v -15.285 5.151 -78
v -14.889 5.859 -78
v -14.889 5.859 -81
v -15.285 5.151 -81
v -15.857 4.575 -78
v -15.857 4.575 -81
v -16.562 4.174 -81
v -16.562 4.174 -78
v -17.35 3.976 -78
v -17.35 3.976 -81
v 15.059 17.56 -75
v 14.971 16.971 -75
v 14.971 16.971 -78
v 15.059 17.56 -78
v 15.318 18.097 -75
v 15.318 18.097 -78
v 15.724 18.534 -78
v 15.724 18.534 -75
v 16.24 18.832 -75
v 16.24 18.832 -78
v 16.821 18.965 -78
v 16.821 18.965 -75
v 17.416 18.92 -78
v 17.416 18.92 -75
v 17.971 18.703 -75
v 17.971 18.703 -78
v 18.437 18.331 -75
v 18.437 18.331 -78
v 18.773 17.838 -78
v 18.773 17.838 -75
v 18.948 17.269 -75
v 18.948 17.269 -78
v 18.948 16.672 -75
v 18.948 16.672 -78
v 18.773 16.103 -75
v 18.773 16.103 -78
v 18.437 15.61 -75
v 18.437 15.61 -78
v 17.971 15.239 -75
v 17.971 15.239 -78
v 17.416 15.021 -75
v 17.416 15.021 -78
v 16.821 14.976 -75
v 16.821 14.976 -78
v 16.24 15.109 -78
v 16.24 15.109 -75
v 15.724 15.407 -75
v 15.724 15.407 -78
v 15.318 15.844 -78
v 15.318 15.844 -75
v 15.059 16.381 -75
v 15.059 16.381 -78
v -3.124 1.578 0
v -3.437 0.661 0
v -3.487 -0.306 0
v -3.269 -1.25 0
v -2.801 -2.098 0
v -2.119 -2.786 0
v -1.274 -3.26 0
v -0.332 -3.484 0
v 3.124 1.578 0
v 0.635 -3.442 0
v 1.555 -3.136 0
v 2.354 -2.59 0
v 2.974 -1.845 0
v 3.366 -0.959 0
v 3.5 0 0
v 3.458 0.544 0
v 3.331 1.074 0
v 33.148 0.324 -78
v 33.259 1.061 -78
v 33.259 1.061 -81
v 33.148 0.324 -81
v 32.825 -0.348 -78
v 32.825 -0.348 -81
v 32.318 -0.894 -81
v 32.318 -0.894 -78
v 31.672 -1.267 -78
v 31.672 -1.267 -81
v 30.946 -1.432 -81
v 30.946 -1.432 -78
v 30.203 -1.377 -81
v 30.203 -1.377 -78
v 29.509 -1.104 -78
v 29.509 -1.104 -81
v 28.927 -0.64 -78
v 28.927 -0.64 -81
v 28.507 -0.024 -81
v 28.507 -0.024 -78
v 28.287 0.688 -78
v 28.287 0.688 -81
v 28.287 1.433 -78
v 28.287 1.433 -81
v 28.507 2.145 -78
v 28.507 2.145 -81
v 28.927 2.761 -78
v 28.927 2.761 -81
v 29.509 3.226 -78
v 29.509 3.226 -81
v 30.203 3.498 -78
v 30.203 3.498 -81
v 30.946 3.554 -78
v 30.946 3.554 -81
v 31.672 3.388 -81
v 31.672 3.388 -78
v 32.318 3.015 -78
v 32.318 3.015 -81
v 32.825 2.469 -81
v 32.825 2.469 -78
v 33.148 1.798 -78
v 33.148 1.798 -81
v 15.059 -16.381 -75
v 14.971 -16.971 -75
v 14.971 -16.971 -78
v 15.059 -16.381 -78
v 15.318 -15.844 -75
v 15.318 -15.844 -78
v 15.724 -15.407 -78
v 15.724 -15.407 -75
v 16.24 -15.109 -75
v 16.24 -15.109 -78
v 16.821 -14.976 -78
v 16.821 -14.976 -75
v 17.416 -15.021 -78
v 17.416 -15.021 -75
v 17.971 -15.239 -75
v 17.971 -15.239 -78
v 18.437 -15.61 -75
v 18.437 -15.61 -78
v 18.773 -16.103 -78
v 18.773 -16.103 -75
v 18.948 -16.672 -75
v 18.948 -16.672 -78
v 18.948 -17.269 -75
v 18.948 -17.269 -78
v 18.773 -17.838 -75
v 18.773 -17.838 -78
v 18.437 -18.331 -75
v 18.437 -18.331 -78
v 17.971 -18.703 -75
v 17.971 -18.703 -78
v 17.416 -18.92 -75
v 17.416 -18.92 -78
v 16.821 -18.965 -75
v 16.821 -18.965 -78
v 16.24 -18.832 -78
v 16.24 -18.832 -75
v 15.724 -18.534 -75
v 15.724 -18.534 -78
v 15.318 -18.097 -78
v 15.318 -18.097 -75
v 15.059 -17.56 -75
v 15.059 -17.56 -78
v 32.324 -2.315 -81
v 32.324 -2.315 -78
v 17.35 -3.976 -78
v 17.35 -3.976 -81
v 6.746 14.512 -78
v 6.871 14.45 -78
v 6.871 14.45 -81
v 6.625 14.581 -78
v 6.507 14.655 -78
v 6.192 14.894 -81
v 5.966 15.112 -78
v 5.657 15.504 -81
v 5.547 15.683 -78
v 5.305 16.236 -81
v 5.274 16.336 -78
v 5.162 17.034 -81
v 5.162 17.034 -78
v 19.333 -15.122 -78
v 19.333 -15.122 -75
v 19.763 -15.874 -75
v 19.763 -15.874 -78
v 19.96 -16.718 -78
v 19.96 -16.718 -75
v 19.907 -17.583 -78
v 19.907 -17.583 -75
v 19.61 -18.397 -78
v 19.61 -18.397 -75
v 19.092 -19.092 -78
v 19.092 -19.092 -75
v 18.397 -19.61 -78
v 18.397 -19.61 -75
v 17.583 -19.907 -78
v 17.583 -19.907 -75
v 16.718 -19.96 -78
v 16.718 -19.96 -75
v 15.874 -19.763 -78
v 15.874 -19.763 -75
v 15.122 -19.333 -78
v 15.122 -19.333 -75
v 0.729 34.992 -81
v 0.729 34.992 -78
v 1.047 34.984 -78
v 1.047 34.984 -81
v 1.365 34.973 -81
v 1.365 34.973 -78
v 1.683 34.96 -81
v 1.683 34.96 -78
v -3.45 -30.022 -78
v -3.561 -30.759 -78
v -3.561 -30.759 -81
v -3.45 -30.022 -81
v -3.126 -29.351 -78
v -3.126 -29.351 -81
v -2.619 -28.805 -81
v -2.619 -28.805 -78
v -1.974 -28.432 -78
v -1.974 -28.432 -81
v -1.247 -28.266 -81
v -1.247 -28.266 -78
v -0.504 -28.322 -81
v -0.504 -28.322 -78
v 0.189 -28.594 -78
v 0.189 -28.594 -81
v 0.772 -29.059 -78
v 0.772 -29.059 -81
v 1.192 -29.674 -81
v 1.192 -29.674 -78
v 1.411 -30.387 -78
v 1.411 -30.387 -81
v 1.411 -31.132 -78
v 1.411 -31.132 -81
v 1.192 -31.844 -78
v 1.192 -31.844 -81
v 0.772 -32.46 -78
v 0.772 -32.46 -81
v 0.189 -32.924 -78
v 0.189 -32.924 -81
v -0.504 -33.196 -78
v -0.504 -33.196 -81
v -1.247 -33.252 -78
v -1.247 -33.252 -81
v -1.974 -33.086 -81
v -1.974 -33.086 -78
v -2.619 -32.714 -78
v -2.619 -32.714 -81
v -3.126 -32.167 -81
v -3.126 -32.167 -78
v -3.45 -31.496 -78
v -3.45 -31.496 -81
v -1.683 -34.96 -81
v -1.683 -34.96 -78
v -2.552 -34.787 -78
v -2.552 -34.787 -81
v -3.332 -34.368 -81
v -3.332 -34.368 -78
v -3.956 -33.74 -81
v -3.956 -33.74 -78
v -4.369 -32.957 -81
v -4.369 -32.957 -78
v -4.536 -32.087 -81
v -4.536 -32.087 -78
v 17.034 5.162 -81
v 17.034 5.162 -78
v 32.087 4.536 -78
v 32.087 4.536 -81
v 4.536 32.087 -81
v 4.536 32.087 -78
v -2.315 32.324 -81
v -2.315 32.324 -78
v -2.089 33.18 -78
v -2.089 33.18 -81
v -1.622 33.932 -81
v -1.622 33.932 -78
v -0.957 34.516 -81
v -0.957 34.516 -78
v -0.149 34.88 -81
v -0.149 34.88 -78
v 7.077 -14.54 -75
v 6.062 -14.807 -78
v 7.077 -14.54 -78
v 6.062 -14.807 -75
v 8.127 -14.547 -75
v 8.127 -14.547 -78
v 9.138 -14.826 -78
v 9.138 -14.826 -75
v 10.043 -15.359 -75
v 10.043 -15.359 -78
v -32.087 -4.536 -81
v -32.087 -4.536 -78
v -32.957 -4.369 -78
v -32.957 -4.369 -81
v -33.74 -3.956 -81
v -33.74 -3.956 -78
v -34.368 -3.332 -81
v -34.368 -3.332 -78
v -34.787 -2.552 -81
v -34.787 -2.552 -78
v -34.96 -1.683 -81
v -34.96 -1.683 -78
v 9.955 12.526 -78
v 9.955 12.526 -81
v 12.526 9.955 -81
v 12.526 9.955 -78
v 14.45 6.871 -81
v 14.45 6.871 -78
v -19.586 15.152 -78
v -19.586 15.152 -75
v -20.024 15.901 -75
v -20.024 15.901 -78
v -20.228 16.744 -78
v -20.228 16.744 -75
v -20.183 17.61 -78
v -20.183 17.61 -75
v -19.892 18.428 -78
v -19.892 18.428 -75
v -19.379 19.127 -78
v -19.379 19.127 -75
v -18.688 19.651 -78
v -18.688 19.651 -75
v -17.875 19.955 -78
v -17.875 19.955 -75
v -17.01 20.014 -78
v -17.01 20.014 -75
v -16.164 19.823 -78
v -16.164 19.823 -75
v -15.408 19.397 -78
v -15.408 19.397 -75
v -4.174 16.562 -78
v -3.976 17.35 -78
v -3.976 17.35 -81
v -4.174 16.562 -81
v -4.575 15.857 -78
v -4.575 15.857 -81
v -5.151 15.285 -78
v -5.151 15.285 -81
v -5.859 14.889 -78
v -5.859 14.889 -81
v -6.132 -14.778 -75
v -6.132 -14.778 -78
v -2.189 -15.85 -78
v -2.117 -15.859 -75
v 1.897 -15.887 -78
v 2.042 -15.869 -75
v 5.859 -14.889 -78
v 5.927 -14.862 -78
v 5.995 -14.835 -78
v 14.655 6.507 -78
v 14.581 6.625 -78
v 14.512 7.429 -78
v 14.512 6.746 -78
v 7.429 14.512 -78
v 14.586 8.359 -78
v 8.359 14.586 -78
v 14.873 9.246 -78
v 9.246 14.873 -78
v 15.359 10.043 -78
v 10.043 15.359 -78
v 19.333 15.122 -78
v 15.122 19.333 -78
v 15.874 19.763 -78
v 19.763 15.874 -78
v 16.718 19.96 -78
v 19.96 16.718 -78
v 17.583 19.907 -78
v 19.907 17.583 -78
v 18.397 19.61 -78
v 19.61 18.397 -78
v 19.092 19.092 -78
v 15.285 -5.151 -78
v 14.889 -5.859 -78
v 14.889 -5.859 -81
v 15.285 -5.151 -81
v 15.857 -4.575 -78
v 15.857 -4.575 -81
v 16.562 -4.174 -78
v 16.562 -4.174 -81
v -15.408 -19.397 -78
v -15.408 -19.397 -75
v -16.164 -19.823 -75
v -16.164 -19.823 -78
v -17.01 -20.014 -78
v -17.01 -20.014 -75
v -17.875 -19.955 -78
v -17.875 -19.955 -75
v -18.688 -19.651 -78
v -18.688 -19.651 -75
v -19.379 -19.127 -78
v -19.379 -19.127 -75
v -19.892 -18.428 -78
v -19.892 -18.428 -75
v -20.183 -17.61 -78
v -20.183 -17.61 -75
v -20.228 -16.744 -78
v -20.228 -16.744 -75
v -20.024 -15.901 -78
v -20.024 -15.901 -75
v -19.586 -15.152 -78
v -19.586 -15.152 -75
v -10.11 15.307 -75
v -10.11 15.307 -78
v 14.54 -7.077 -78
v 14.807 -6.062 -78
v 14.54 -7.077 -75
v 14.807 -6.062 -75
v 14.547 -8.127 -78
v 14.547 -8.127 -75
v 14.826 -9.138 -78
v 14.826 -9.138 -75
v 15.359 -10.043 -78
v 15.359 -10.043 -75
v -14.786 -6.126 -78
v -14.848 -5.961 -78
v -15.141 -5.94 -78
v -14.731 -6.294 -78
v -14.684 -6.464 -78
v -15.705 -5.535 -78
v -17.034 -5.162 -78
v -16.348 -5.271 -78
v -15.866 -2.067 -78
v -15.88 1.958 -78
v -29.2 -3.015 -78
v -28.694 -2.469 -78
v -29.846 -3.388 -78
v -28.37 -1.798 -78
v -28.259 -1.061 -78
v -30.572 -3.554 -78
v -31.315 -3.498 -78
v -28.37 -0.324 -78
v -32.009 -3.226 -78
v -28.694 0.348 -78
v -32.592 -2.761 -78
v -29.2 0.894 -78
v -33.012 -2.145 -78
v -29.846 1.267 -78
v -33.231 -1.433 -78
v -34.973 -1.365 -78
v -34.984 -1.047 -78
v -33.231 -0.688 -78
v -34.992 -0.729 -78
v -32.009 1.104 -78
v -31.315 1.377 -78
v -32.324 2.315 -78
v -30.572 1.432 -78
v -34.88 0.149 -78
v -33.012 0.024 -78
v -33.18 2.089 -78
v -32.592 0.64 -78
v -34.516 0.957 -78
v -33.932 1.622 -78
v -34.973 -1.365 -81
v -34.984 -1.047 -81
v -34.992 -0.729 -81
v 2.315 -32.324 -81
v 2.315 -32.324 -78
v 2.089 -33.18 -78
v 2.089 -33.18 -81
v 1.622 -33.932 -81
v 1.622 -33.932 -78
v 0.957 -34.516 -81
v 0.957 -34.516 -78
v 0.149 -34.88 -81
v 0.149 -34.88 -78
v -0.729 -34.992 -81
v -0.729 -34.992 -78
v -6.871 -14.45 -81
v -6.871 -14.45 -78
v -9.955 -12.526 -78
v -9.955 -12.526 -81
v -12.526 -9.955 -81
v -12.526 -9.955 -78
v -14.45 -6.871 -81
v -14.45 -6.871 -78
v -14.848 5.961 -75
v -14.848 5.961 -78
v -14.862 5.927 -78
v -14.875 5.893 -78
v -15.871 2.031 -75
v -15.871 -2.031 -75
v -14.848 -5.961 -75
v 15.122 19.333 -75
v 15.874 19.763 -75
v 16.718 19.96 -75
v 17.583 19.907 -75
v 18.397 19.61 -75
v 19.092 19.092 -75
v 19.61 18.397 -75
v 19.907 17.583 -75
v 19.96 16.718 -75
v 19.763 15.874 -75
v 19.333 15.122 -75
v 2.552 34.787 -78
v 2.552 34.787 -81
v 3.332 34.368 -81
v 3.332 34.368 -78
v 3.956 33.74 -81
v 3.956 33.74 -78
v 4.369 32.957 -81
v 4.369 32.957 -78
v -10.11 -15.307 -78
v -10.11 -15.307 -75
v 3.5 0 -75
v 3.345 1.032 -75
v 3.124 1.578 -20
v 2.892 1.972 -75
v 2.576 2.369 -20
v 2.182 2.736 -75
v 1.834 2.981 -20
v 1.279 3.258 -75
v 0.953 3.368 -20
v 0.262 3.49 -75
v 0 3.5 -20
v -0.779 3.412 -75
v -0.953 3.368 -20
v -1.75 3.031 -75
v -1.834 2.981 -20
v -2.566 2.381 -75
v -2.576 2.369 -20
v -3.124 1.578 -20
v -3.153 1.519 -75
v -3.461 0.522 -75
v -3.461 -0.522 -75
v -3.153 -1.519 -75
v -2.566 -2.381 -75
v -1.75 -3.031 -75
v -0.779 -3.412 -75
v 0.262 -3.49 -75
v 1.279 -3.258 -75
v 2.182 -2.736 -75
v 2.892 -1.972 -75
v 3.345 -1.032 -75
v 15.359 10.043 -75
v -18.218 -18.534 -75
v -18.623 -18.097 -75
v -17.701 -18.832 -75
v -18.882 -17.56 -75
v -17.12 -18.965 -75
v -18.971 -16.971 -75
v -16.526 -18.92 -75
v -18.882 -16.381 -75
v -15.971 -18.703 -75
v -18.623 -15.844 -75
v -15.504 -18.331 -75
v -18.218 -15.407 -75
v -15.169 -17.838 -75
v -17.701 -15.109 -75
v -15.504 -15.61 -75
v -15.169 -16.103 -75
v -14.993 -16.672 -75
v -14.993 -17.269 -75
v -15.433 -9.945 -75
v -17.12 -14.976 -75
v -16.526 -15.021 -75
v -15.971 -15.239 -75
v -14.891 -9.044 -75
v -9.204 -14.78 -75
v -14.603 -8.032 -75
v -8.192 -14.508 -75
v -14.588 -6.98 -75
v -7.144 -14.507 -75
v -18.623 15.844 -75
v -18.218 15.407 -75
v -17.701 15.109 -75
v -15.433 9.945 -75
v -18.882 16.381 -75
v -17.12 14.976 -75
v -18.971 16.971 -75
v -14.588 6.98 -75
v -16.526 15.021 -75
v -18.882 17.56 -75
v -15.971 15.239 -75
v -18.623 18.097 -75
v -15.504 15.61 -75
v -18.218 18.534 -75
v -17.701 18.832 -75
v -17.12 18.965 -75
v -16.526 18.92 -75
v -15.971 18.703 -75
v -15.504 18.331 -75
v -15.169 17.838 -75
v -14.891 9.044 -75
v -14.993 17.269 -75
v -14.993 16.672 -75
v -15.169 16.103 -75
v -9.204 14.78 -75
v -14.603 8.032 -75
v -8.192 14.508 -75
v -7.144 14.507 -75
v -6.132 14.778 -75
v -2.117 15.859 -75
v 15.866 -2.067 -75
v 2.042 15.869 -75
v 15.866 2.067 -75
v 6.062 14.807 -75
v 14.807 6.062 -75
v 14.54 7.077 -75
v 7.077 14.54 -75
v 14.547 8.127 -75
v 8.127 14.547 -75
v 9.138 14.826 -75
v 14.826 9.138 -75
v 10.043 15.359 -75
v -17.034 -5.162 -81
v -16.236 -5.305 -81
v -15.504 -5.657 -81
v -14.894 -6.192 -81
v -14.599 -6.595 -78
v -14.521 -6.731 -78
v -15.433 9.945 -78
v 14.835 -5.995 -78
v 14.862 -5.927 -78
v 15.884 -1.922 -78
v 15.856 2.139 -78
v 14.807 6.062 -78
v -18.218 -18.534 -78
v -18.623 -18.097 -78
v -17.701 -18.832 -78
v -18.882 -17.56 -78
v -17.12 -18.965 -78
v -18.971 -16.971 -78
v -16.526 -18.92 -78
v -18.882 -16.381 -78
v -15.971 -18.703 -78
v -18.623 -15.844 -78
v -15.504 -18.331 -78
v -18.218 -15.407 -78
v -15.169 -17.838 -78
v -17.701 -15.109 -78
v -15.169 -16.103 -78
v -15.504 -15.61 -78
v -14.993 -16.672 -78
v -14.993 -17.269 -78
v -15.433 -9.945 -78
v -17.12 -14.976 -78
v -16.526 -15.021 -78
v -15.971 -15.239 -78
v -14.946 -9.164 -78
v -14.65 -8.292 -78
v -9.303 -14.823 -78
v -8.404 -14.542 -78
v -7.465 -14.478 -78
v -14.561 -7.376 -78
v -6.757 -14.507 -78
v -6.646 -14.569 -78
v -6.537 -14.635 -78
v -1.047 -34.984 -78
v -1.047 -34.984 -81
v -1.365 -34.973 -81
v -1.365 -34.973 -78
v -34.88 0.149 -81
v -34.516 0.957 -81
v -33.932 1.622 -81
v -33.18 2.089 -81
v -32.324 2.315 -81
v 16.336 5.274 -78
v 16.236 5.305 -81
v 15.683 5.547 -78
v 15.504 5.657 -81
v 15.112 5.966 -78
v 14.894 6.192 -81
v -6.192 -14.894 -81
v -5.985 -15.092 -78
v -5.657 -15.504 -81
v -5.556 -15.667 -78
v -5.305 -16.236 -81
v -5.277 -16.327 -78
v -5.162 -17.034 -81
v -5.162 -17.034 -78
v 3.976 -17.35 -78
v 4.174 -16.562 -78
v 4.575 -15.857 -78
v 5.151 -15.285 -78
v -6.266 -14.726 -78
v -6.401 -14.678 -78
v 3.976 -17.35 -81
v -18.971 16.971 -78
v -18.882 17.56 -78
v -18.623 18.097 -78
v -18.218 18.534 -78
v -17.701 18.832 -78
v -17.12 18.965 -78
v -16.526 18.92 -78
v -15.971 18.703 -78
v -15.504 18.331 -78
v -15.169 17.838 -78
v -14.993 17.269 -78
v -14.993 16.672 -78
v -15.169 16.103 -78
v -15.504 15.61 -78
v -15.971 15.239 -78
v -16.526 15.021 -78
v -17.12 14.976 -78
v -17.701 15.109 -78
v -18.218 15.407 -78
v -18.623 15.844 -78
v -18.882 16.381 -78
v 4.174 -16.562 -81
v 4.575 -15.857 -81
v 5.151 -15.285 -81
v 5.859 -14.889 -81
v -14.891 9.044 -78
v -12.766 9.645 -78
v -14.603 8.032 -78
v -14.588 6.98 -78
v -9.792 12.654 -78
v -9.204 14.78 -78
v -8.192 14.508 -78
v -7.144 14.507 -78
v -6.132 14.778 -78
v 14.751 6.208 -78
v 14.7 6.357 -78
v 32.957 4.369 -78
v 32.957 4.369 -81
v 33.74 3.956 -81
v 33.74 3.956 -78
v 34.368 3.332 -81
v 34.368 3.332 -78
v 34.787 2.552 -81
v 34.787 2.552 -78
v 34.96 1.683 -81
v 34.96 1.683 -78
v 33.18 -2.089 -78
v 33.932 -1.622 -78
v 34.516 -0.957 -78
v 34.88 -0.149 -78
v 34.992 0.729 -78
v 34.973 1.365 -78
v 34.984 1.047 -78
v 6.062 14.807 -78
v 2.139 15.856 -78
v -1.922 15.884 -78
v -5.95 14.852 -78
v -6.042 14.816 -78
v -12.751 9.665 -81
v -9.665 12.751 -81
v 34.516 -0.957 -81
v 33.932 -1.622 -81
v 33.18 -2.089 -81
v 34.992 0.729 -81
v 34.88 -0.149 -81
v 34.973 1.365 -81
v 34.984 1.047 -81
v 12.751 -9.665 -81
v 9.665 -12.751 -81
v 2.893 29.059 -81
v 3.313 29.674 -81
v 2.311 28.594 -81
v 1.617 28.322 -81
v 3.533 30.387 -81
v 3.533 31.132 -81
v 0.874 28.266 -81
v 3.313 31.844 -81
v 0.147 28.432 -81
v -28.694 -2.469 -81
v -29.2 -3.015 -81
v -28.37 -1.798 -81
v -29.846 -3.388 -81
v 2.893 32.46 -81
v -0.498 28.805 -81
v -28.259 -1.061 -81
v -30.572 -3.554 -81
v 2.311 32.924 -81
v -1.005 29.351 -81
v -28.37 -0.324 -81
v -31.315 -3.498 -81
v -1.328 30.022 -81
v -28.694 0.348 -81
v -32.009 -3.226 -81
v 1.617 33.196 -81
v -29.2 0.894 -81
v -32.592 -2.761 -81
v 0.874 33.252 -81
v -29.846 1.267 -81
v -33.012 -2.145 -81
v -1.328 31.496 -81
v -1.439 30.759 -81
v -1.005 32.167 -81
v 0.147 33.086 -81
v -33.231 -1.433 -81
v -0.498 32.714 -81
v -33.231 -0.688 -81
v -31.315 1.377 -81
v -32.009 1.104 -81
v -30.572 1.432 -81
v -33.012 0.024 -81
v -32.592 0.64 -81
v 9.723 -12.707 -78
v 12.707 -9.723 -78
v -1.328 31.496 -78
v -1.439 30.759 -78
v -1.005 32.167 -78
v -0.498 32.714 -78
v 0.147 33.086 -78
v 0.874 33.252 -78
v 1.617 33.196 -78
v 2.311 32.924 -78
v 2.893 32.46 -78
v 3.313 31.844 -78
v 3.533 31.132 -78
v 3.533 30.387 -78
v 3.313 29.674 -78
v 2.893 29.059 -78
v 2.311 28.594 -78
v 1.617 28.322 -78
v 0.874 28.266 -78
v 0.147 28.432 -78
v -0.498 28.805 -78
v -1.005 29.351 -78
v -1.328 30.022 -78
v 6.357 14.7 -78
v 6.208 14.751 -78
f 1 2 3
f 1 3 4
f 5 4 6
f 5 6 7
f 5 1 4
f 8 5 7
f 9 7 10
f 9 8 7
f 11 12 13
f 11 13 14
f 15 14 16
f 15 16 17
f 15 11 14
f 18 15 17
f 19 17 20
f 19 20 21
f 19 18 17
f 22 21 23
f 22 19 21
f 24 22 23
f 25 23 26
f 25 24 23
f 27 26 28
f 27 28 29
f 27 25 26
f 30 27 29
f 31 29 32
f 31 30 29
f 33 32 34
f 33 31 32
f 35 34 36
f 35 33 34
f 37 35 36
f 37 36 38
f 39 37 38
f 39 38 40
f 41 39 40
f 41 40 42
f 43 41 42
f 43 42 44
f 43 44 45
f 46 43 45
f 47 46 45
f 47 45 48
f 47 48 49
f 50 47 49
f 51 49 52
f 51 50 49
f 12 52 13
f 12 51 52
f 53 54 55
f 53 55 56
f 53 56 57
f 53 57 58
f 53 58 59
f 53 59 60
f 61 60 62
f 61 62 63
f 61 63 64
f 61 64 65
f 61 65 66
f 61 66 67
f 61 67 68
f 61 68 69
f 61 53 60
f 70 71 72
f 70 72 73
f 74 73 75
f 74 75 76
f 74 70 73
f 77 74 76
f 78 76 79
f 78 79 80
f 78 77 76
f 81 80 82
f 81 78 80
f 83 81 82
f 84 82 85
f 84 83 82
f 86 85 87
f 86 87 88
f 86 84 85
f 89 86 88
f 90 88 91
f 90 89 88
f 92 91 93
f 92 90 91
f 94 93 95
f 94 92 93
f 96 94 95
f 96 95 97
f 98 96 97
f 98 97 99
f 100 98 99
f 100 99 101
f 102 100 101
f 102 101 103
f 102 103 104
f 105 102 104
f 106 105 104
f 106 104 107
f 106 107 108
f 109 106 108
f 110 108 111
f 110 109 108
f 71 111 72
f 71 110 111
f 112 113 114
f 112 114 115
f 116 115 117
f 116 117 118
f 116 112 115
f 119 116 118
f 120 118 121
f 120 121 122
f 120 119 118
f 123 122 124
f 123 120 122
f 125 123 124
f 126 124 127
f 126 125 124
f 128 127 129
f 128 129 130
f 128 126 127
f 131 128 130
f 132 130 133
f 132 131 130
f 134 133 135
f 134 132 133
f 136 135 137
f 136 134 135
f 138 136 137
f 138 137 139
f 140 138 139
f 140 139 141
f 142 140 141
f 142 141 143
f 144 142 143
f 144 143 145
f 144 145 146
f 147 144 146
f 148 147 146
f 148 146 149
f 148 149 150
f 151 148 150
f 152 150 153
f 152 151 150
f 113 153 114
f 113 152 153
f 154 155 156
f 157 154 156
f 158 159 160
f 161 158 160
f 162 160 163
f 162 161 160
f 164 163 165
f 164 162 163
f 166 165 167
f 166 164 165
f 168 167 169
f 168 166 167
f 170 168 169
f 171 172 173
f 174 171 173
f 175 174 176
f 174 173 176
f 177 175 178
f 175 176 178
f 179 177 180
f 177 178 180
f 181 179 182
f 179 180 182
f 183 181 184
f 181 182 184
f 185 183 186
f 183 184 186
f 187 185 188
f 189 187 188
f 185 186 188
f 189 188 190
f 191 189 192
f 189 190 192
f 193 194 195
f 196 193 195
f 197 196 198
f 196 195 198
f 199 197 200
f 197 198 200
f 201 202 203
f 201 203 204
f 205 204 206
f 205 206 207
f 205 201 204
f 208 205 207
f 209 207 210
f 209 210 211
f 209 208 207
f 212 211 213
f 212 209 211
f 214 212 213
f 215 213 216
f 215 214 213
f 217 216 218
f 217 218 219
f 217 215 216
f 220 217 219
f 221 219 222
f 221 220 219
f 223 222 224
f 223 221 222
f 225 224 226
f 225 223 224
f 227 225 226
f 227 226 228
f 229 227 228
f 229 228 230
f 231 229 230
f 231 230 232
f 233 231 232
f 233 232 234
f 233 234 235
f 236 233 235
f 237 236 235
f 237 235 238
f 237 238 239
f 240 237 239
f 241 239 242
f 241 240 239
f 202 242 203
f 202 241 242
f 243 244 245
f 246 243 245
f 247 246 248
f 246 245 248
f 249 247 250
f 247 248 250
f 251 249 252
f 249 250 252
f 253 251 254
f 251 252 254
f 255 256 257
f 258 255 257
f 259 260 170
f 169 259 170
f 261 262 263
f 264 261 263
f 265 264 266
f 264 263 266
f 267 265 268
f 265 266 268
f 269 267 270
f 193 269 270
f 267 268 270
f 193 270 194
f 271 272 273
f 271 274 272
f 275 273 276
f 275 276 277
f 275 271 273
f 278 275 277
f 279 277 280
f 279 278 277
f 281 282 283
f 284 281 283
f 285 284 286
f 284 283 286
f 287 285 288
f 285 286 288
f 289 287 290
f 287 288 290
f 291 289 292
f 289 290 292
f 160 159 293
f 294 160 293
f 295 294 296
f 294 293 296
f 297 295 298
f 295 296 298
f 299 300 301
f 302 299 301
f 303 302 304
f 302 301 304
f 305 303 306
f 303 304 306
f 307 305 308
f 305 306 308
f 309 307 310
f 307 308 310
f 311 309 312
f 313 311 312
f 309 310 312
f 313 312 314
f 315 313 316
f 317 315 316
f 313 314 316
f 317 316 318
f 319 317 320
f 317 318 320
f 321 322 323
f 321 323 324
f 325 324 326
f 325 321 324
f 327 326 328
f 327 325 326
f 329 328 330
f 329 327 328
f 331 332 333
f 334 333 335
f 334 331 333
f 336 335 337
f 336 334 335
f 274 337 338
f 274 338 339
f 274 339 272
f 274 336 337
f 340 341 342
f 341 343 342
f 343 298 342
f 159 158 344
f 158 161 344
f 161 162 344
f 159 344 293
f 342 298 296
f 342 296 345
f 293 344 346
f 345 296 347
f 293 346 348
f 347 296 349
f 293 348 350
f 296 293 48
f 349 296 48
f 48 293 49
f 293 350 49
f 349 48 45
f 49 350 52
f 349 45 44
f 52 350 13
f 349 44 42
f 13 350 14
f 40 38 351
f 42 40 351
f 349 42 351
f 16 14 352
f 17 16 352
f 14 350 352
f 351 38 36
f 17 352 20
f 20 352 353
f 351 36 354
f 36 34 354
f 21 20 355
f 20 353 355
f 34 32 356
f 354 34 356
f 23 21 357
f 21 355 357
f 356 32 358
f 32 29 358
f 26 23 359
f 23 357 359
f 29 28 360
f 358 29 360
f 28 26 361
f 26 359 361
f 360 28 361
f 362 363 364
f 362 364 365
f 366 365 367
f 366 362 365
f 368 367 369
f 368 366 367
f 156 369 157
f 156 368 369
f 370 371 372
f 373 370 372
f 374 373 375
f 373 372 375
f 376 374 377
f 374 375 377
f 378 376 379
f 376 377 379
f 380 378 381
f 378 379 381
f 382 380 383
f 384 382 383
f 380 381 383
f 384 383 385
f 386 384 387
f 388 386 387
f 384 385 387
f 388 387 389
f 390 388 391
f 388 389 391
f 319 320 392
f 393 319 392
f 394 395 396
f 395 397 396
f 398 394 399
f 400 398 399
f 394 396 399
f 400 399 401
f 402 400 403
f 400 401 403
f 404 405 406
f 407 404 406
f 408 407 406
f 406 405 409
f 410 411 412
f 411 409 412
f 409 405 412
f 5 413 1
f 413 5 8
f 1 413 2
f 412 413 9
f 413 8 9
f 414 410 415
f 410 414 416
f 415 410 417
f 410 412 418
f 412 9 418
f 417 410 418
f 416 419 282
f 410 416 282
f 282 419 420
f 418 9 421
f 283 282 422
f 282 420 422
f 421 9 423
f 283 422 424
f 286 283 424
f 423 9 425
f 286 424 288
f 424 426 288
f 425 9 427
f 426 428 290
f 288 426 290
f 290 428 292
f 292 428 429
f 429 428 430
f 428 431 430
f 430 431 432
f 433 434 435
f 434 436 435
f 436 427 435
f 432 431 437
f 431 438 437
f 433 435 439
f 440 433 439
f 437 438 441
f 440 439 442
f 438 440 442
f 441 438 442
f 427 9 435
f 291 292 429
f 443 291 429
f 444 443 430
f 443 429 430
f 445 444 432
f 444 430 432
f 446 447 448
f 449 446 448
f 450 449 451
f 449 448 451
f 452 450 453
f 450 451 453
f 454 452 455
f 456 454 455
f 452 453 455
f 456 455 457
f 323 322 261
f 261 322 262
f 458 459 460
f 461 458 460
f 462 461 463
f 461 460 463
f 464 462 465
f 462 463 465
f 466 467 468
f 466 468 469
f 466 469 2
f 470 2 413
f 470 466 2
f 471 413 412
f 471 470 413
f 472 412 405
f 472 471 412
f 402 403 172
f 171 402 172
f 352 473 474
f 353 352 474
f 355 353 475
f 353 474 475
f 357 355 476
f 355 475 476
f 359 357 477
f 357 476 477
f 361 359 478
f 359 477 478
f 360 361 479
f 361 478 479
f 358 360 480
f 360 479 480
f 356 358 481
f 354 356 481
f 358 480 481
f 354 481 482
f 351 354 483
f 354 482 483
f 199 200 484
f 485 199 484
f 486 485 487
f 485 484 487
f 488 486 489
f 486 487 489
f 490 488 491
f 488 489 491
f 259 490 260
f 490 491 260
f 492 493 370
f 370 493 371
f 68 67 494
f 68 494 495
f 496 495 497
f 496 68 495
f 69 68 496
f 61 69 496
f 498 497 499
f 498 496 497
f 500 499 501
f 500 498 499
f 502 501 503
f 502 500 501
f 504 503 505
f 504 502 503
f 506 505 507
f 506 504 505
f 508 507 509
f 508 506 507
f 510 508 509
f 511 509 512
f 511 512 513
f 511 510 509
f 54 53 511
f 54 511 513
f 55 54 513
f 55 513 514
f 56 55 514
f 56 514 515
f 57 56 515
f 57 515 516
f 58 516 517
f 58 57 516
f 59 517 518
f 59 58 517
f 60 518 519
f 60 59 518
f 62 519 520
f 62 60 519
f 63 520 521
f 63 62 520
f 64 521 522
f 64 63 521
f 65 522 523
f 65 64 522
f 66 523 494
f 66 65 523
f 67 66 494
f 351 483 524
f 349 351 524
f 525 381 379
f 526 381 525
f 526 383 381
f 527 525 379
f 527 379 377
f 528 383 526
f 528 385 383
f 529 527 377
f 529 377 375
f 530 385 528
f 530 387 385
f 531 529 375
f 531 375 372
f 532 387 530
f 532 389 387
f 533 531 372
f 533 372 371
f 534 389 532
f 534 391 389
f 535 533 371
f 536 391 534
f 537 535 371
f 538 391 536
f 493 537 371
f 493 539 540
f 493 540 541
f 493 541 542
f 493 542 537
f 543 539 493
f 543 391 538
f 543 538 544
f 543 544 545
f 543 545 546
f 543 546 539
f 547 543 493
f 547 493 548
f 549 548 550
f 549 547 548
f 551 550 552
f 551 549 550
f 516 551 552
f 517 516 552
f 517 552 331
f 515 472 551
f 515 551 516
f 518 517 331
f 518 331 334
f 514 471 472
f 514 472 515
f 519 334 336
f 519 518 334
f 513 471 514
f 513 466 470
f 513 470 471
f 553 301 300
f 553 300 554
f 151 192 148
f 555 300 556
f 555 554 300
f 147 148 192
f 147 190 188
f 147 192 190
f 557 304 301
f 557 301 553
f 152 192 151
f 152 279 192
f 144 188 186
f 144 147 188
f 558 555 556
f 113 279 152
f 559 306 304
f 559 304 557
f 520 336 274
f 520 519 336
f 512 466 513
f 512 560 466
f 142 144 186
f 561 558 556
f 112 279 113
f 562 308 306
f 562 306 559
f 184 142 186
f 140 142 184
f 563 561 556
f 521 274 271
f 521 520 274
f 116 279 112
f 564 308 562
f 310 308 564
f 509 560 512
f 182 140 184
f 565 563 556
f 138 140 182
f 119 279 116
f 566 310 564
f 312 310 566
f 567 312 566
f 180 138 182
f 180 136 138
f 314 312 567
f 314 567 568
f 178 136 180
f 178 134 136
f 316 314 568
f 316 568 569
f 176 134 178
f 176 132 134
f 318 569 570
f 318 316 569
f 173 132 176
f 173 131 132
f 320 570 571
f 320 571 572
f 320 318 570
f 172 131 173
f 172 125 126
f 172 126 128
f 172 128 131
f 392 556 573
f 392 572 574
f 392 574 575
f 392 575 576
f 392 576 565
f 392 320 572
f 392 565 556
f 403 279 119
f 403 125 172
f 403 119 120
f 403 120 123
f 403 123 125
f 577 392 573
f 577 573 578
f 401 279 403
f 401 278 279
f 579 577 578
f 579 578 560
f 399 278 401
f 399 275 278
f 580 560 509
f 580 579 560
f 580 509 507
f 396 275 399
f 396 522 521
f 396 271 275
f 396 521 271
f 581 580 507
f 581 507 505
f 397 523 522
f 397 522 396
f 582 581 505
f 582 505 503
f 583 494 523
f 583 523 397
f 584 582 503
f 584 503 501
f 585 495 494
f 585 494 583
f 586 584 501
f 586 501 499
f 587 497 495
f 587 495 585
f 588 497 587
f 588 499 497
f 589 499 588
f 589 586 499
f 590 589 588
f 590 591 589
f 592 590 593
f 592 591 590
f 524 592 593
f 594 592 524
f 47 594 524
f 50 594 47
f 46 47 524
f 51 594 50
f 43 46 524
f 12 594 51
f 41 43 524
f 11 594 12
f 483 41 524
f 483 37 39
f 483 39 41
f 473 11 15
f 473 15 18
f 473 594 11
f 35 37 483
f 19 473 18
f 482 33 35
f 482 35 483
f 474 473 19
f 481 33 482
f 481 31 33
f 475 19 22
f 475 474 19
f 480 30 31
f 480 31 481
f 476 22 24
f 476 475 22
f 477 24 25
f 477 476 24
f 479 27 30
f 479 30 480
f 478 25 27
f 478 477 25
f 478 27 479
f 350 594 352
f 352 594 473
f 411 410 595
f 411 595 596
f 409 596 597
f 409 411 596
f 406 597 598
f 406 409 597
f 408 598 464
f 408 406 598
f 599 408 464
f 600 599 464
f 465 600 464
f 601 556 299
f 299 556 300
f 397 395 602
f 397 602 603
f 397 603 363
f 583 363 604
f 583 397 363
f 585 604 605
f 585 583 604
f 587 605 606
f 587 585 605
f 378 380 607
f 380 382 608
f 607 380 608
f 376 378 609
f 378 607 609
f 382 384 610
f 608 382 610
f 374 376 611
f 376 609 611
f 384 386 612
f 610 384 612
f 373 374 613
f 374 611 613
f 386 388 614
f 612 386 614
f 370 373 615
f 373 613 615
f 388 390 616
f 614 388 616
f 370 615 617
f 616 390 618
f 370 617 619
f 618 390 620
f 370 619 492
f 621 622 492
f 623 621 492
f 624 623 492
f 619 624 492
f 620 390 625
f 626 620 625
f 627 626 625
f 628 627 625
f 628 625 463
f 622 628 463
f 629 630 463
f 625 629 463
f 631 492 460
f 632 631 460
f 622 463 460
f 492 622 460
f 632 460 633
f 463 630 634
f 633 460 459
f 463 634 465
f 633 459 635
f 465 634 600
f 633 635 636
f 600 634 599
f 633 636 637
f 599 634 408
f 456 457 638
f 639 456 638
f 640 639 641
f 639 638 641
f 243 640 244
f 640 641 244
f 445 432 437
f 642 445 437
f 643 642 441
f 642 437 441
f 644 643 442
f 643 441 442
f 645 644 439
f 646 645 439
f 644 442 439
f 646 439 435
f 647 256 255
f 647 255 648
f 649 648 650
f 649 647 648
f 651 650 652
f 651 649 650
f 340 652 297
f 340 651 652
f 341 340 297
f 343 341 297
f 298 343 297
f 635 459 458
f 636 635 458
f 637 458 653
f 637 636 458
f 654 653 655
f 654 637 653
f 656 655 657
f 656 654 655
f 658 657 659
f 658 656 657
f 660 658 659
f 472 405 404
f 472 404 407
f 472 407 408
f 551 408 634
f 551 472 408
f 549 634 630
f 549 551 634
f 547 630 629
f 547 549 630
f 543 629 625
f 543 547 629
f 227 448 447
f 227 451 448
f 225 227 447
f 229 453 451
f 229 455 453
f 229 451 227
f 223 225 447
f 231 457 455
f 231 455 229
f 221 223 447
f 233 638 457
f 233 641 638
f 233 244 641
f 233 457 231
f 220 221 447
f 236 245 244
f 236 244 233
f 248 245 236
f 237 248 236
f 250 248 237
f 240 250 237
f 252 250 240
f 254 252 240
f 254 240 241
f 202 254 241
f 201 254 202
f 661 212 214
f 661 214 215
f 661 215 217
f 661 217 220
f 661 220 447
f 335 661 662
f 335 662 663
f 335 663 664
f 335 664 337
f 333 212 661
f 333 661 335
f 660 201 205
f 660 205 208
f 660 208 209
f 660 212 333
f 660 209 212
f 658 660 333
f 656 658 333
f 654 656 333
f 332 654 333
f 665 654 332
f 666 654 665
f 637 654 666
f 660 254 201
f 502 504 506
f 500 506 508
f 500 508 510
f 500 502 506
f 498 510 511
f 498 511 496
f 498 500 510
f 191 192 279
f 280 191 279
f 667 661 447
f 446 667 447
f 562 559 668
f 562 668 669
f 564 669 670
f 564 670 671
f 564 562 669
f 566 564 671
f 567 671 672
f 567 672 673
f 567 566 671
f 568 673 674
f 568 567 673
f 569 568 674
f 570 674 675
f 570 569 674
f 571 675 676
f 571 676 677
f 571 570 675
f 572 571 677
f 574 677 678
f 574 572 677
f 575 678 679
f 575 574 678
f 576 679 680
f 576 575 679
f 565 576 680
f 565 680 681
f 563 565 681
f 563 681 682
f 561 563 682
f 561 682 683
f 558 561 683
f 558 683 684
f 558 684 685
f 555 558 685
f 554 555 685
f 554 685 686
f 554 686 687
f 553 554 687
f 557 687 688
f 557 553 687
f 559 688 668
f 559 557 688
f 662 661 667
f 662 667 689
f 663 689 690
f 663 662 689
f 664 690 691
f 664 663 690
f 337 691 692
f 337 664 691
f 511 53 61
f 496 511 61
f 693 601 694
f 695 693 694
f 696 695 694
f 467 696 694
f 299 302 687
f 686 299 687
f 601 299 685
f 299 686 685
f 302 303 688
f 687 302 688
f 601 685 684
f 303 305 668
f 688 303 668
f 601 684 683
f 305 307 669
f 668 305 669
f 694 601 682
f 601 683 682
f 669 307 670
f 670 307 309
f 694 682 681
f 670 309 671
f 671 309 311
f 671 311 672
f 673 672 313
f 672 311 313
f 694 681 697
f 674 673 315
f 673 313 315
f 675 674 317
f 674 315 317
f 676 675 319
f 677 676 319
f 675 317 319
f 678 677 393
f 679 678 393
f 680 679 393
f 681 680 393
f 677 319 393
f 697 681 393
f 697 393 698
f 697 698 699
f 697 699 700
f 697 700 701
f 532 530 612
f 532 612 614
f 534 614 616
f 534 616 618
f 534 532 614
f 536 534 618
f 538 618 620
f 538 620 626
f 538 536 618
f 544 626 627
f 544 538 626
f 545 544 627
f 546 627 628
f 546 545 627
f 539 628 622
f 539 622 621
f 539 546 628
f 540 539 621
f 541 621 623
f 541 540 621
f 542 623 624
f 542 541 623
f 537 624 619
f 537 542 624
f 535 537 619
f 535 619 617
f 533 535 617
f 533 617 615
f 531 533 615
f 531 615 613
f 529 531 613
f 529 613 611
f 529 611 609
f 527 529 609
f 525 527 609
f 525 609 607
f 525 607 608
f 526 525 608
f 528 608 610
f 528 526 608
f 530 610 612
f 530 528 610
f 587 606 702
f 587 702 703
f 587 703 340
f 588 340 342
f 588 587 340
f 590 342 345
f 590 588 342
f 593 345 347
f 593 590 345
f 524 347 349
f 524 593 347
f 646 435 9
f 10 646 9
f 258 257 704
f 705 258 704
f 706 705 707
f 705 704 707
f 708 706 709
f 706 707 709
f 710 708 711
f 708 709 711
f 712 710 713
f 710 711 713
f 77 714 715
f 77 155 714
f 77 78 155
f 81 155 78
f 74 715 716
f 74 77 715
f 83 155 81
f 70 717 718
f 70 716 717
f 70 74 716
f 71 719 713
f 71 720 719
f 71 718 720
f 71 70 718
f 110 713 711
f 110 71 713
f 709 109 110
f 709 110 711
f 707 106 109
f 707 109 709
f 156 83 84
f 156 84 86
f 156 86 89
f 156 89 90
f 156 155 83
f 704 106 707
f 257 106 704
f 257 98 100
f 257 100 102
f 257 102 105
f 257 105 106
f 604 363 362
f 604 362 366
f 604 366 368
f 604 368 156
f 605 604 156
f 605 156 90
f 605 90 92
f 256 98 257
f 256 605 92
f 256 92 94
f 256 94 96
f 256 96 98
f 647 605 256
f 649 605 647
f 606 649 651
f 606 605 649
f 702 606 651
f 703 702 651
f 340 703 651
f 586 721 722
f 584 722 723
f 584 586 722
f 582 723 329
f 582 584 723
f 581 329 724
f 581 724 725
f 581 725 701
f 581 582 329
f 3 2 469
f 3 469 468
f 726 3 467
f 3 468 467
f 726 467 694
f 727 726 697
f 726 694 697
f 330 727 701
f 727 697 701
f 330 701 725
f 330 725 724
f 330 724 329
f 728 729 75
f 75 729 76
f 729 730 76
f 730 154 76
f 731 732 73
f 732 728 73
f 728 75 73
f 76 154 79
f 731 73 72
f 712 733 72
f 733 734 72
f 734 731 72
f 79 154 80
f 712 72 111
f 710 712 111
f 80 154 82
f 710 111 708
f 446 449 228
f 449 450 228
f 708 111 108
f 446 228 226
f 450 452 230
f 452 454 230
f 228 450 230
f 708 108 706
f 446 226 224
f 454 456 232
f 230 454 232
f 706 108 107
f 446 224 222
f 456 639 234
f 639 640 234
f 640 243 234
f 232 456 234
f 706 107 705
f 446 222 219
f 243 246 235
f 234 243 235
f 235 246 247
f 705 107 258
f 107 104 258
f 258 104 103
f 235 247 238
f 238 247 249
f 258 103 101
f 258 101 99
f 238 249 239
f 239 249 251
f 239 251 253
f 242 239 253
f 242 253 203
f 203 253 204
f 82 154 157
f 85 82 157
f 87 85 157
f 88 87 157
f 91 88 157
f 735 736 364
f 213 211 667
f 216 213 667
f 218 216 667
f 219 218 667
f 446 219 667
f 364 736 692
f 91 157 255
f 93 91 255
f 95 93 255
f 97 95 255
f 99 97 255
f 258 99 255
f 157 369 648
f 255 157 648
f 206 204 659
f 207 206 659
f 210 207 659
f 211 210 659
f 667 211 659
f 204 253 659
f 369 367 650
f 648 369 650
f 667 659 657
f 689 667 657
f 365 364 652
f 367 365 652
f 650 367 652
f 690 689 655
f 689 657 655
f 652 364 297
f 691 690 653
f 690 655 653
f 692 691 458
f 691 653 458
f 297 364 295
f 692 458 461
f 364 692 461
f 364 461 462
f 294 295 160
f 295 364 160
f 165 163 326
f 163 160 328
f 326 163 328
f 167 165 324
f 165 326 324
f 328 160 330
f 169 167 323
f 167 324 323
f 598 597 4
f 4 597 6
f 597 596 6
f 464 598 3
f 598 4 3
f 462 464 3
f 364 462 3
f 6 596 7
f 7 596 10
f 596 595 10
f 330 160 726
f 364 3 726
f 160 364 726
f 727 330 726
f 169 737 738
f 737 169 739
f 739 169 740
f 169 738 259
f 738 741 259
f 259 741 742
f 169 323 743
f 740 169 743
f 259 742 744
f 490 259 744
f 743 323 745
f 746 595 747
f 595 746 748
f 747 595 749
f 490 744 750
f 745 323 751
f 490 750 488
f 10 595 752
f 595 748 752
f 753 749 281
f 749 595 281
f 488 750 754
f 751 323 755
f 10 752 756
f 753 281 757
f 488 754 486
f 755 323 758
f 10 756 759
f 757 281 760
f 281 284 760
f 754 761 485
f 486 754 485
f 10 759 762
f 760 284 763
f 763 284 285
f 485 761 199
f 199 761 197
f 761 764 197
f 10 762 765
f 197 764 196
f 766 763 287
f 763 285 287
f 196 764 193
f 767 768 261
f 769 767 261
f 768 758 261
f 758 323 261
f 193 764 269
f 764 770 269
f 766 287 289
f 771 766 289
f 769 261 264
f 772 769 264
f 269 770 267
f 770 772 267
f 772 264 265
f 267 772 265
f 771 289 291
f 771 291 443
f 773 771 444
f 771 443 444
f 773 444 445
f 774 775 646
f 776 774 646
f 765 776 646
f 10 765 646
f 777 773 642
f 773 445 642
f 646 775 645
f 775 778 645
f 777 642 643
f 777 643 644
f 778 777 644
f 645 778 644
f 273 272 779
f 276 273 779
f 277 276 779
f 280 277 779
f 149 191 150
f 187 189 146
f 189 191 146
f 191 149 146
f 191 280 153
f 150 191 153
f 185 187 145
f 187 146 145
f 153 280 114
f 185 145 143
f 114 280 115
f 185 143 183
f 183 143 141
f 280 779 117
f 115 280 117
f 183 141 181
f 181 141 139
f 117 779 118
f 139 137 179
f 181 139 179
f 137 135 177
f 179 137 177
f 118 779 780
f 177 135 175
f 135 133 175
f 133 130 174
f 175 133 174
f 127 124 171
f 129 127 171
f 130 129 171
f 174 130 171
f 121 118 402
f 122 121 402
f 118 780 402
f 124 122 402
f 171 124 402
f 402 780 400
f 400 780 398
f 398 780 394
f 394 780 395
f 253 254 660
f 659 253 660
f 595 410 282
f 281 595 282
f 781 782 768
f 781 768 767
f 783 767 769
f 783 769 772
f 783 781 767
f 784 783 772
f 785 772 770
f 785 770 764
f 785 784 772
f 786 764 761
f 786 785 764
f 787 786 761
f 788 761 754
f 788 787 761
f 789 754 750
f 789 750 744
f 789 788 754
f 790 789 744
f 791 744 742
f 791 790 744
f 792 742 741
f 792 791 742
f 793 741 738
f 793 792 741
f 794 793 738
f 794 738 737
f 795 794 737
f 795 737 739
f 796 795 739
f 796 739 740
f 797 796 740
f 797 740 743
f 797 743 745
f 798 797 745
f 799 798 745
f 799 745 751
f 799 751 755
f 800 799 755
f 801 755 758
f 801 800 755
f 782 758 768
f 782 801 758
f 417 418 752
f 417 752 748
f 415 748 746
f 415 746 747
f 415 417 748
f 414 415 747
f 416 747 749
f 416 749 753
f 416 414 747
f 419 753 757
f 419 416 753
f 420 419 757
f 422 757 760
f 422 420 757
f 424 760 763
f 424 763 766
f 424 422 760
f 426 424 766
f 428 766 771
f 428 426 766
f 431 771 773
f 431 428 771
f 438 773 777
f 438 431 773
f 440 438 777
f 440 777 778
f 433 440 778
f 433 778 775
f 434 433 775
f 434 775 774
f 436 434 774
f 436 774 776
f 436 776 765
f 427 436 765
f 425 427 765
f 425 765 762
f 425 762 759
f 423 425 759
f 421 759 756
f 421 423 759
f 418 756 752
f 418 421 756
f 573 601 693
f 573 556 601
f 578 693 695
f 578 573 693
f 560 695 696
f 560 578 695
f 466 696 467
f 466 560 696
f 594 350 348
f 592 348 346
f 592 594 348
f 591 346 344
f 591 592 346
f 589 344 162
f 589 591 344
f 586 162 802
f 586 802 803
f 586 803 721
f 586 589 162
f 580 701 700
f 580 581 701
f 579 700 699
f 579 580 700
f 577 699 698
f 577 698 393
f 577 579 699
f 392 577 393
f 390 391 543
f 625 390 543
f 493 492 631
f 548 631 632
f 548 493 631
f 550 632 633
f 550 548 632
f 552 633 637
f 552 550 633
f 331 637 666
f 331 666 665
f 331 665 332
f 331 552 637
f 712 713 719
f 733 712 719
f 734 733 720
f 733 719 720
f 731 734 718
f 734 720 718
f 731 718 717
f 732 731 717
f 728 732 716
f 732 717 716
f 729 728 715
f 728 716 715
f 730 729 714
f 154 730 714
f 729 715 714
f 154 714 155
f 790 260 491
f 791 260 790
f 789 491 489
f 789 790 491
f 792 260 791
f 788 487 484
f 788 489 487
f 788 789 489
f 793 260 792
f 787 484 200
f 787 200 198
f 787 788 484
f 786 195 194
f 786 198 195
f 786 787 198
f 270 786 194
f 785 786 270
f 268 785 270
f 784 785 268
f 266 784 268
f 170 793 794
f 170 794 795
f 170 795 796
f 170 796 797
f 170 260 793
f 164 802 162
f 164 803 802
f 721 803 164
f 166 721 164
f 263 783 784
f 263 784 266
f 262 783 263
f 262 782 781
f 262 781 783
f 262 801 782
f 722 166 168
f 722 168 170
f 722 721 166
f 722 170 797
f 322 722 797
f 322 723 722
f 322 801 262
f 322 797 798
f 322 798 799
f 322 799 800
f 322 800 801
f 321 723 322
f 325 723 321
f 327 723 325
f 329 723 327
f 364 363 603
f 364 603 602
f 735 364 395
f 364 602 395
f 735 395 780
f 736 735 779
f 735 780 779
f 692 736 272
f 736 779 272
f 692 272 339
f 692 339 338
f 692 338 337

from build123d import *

# Parameters (mm, degrees)
SKETCH_2_R          = 3.5
EXTRUDE_1_DEPTH     = 75
SKETCH_3_R          = 2
EXTRUDE_2_DEPTH     = 3
FILLET_1_R          = 5
SKETCH_5_R          = 16
EXTRUDE_3_DEPTH     = 3
FILLET_2_R          = 4
SKETCH_6_R          = 2.5
EXTRUDE_4_DEPTH     = 3
FILLET_3_R          = 3
FILLET_4_R          = 3
CUT_EXTRUDE_1_DEPTH = 20


with BuildPart() as part:
    # 草图2 → 凸台-拉伸1 (new body)
    with BuildSketch(Plane.XY):
        Circle(SKETCH_2_R)
    extrude(amount=-EXTRUDE_1_DEPTH)

    # 草图3 → 凸台-拉伸2 (add)
    with BuildSketch(Plane(origin=(0, 0, -75), x_dir=(-1, 0, 0), z_dir=(0, 0, -1))):
        with BuildLine():
            Line((-19.333172355, 15.121758852), (-7.5, 0))
            Line((-7.5, 0), (-19.333172355, -15.121758852))
            ThreePointArc((-19.333172355, -15.121758852), (-19.091883092, -19.091883092), (-15.121758852, -19.333172355))
            Line((-15.121758852, -19.333172355), (0, -7.5))
            Line((0, -7.5), (15.407660085, -19.397223244))
            ThreePointArc((15.407660085, -19.397223244), (19.379165256, -19.127226562), (19.586420792, -15.151953404))
            Line((19.586420792, -15.151953404), (7.5, 0))
            Line((7.5, 0), (19.586420792, 15.151953404))
            ThreePointArc((19.586420792, 15.151953404), (19.379165256, 19.127226562), (15.407660085, 19.397223244))
            Line((15.407660085, 19.397223244), (0, 7.5))
            Line((0, 7.5), (-15.121758852, 19.333172355))
            ThreePointArc((-15.121758852, 19.333172355), (-19.091883092, 19.091883092), (-19.333172355, 15.121758852))
        make_face()
        with Locations((-16.970562748, 16.970562748)):
            Circle(SKETCH_3_R, mode=Mode.SUBTRACT)
        with Locations((16.970562748, 16.970562748)):
            Circle(SKETCH_3_R, mode=Mode.SUBTRACT)
        with Locations((16.970562748, -16.970562748)):
            Circle(SKETCH_3_R, mode=Mode.SUBTRACT)
        with Locations((-16.970562748, -16.970562748)):
            Circle(SKETCH_3_R, mode=Mode.SUBTRACT)
    extrude(amount=EXTRUDE_2_DEPTH)

    # 圆角1
    fillet_1_edges = [part.edges().sort_by_distance(p)[0] for p in [
        (7.5, 0, -76.5),
        (0, -7.5, -76.5),
        (-7.5, 0, -76.5),
        (0, 7.5, -76.5),
    ]]
    fillet(fillet_1_edges, radius=FILLET_1_R)

    # 草图5 → 凸台-拉伸3 (add)
    with BuildSketch(Plane.XY.offset(-75)):
        Circle(SKETCH_5_R)
    extrude(amount=-EXTRUDE_3_DEPTH)

    # 圆角2
    fillet_2_edges = [part.edges().sort_by_distance(p)[0] for p in [
        (8.070562783, -13.815426753, -76.5),
        (13.815426753, -8.070562783, -76.5),
        (-8.132091519, -13.779299239, -76.5),
        (-13.866910674, -7.981778521, -76.5),
        (-13.866910674, 7.981778521, -76.5),
        (-8.132091519, 13.779299239, -76.5),
        (8.070562783, 13.815426753, -76.5),
        (13.815426753, 8.070562783, -76.5),
    ]]
    fillet(fillet_2_edges, radius=FILLET_2_R)

    # 草图6 → 凸台-拉伸4 (add)
    with BuildSketch(Plane(origin=(0, 0, -78), x_dir=(-1, 0, 0), z_dir=(0, 0, -1))):
        with BuildLine():
            Line((-4.536268833, 32.087497482), (-5.241257707, 15.117182861))
            ThreePointArc((-5.241257707, 15.117182861), (-11.313708499, 11.313708499), (-15.117182861, 5.241257707))
            Line((-15.117182861, 5.241257707), (-32.087497482, 4.536268833))
            ThreePointArc((-32.087497482, 4.536268833), (-34.077297457, 3.667151814), (-34.959506593, 1.683121729))
            ThreePointArc((-34.959506593, 1.683121729), (-34.979209977, 1.206179654), (-34.992406887, 0.729013218))
            ThreePointArc((-34.992406887, 0.729013218), (-34.248960415, -1.311073956), (-32.323754723, -2.31519117))
            Line((-32.323754723, -2.31519117), (-15.442311817, -4.187482029))
            ThreePointArc((-15.442311817, -4.187482029), (-11.313708499, -11.313708499), (-4.187482029, -15.442311817))
            Line((-4.187482029, -15.442311817), (-2.31519117, -32.323754723))
            ThreePointArc((-2.31519117, -32.323754723), (-1.311073956, -34.248960415), (0.729013218, -34.992406887))
            ThreePointArc((0.729013218, -34.992406887), (1.206179654, -34.979209977), (1.683121729, -34.959506593))
            ThreePointArc((1.683121729, -34.959506593), (3.667151814, -34.077297457), (4.536268833, -32.087497482))
            Line((4.536268833, -32.087497482), (5.241257707, -15.117182861))
            ThreePointArc((5.241257707, -15.117182861), (11.313708499, -11.313708499), (15.117182861, -5.241257707))
            Line((15.117182861, -5.241257707), (32.087497482, -4.536268833))
            ThreePointArc((32.087497482, -4.536268833), (34.077297457, -3.667151814), (34.959506593, -1.683121729))
            ThreePointArc((34.959506593, -1.683121729), (34.979209977, -1.206179654), (34.992406887, -0.729013218))
            ThreePointArc((34.992406887, -0.729013218), (34.248960415, 1.311073956), (32.323754723, 2.31519117))
            Line((32.323754723, 2.31519117), (15.442311817, 4.187482029))
            ThreePointArc((15.442311817, 4.187482029), (11.313708499, 11.313708499), (4.187482029, 15.442311817))
            Line((4.187482029, 15.442311817), (2.31519117, 32.323754723))
            ThreePointArc((2.31519117, 32.323754723), (1.311073956, 34.248960415), (-0.729013218, 34.992406887))
            ThreePointArc((-0.729013218, 34.992406887), (-1.206179654, 34.979209977), (-1.683121729, 34.959506593))
            ThreePointArc((-1.683121729, 34.959506593), (-3.667151814, 34.077297457), (-4.536268833, 32.087497482))
        make_face()
        with Locations((-1.060660172, 30.759144982)):
            Circle(SKETCH_6_R, mode=Mode.SUBTRACT)
        with Locations(Location((30.759144982, -1.060660172, 0), (0, 0, 180))):
            Circle(SKETCH_6_R, mode=Mode.SUBTRACT)
        with Locations((1.060660172, -30.759144982)):
            Circle(SKETCH_6_R, mode=Mode.SUBTRACT)
        with Locations(Location((-30.759144982, 1.060660172, 0), (0, 0, 180))):
            Circle(SKETCH_6_R, mode=Mode.SUBTRACT)
    extrude(amount=EXTRUDE_4_DEPTH)

    # 圆角3
    # the kernel refuses this fillet: 3 mm, written as the material it adds along each edge
    with BuildSketch(Plane(origin=(5.241257707, 15.117182861, -78), x_dir=(0.9253660102129004, -0.379074856911743, 0), z_dir=(0, 0, -1))) as fillet_3_piece_1:
        with BuildLine():
            CenterArc((1.926011056, -2.995454288), FILLET_3_R, 93.154516435, 62.190253948)
            Line((-0.800492197, -1.743983149), (0, 0))
            ThreePointArc((0, 0), (0.880462197, -0.024243795), (1.760924394, 0))
        make_face()
    extrude(amount=3)

    # 圆角4
    # the kernel refuses this fillet: 3 mm, written as the material it adds along each edge
    with BuildSketch(Plane(origin=(15.117182861, 5.241257707, -78), x_dir=(-0.379074856911857, 0.9253660102128536, 0), z_dir=(0, 0, -1)), Plane(origin=(4.187482029, -15.442311817, -78), x_dir=(0.9492800359617337, 0.3144318898020519, 0), z_dir=(0, 0, -1)), Plane(origin=(-15.117182861, -5.241257707, -78), x_dir=(0.3790748569116308, -0.9253660102129463, 0), z_dir=(0, 0, -1)), Plane(origin=(-4.187482029, 15.442311817, -78), x_dir=(-0.9492800359616571, -0.3144318898022824, 0), z_dir=(0, 0, -1))) as fillet_4_piece_1:
        with BuildLine():
            CenterArc((1.926011056, 2.995454288), FILLET_4_R, 204.655229617, 62.190253948)
            Line((-0.800492197, 1.743983149), (0, 0))
            ThreePointArc((0, 0), (0.880462197, 0.024243795), (1.760924394, 0))
        make_face()
    extrude(amount=3)
    with BuildSketch(Plane(origin=(15.442311817, -4.187482029, -78), x_dir=(-0.314431889802168, -0.9492800359616952, 0), z_dir=(0, 0, -1))) as fillet_4_piece_2:
        with BuildLine():
            CenterArc((1.926011056, -2.995454288), FILLET_4_R, 93.154516435, 62.190253948)
            Line((-0.800492197, -1.743983149), (0, 0))
            ThreePointArc((0, 0), (0.880462197, -0.024243795), (1.760924394, 0))
        make_face()
    extrude(amount=3)
    with BuildSketch(Plane(origin=(-5.241257707, -15.117182861, -78), x_dir=(0.04150667502361383, -0.999138226637578, 0), z_dir=(0, 0, -1)), Plane(origin=(-15.442311817, 4.187482029, -78), x_dir=(-0.9939058470596024, -0.11023233273742473, 0), z_dir=(0, 0, -1))) as fillet_4_piece_3:
        with BuildLine():
            CenterArc((1.91892287, 3), FILLET_4_R, 207.809746052, 62.190253948)
            ThreePointArc((-0.734582019, 1.600388696), (-0.345257414, 0.810307818), (0, 0))
            Line((0, 0), (1.91892287, 0))
        make_face()
    extrude(amount=3)

    # 草图8 → 切除-拉伸1 (cut)
    with BuildSketch(Plane.XY):
        Polygon((-3.12402203, 1.578127484), (3.12402203, 1.578127484), (3.250549132, 4.217874186), (-3.12402203, 4.393016319), align=None)
    extrude(amount=-CUT_EXTRUDE_1_DEPTH, mode=Mode.SUBTRACT)


solid = part.part
